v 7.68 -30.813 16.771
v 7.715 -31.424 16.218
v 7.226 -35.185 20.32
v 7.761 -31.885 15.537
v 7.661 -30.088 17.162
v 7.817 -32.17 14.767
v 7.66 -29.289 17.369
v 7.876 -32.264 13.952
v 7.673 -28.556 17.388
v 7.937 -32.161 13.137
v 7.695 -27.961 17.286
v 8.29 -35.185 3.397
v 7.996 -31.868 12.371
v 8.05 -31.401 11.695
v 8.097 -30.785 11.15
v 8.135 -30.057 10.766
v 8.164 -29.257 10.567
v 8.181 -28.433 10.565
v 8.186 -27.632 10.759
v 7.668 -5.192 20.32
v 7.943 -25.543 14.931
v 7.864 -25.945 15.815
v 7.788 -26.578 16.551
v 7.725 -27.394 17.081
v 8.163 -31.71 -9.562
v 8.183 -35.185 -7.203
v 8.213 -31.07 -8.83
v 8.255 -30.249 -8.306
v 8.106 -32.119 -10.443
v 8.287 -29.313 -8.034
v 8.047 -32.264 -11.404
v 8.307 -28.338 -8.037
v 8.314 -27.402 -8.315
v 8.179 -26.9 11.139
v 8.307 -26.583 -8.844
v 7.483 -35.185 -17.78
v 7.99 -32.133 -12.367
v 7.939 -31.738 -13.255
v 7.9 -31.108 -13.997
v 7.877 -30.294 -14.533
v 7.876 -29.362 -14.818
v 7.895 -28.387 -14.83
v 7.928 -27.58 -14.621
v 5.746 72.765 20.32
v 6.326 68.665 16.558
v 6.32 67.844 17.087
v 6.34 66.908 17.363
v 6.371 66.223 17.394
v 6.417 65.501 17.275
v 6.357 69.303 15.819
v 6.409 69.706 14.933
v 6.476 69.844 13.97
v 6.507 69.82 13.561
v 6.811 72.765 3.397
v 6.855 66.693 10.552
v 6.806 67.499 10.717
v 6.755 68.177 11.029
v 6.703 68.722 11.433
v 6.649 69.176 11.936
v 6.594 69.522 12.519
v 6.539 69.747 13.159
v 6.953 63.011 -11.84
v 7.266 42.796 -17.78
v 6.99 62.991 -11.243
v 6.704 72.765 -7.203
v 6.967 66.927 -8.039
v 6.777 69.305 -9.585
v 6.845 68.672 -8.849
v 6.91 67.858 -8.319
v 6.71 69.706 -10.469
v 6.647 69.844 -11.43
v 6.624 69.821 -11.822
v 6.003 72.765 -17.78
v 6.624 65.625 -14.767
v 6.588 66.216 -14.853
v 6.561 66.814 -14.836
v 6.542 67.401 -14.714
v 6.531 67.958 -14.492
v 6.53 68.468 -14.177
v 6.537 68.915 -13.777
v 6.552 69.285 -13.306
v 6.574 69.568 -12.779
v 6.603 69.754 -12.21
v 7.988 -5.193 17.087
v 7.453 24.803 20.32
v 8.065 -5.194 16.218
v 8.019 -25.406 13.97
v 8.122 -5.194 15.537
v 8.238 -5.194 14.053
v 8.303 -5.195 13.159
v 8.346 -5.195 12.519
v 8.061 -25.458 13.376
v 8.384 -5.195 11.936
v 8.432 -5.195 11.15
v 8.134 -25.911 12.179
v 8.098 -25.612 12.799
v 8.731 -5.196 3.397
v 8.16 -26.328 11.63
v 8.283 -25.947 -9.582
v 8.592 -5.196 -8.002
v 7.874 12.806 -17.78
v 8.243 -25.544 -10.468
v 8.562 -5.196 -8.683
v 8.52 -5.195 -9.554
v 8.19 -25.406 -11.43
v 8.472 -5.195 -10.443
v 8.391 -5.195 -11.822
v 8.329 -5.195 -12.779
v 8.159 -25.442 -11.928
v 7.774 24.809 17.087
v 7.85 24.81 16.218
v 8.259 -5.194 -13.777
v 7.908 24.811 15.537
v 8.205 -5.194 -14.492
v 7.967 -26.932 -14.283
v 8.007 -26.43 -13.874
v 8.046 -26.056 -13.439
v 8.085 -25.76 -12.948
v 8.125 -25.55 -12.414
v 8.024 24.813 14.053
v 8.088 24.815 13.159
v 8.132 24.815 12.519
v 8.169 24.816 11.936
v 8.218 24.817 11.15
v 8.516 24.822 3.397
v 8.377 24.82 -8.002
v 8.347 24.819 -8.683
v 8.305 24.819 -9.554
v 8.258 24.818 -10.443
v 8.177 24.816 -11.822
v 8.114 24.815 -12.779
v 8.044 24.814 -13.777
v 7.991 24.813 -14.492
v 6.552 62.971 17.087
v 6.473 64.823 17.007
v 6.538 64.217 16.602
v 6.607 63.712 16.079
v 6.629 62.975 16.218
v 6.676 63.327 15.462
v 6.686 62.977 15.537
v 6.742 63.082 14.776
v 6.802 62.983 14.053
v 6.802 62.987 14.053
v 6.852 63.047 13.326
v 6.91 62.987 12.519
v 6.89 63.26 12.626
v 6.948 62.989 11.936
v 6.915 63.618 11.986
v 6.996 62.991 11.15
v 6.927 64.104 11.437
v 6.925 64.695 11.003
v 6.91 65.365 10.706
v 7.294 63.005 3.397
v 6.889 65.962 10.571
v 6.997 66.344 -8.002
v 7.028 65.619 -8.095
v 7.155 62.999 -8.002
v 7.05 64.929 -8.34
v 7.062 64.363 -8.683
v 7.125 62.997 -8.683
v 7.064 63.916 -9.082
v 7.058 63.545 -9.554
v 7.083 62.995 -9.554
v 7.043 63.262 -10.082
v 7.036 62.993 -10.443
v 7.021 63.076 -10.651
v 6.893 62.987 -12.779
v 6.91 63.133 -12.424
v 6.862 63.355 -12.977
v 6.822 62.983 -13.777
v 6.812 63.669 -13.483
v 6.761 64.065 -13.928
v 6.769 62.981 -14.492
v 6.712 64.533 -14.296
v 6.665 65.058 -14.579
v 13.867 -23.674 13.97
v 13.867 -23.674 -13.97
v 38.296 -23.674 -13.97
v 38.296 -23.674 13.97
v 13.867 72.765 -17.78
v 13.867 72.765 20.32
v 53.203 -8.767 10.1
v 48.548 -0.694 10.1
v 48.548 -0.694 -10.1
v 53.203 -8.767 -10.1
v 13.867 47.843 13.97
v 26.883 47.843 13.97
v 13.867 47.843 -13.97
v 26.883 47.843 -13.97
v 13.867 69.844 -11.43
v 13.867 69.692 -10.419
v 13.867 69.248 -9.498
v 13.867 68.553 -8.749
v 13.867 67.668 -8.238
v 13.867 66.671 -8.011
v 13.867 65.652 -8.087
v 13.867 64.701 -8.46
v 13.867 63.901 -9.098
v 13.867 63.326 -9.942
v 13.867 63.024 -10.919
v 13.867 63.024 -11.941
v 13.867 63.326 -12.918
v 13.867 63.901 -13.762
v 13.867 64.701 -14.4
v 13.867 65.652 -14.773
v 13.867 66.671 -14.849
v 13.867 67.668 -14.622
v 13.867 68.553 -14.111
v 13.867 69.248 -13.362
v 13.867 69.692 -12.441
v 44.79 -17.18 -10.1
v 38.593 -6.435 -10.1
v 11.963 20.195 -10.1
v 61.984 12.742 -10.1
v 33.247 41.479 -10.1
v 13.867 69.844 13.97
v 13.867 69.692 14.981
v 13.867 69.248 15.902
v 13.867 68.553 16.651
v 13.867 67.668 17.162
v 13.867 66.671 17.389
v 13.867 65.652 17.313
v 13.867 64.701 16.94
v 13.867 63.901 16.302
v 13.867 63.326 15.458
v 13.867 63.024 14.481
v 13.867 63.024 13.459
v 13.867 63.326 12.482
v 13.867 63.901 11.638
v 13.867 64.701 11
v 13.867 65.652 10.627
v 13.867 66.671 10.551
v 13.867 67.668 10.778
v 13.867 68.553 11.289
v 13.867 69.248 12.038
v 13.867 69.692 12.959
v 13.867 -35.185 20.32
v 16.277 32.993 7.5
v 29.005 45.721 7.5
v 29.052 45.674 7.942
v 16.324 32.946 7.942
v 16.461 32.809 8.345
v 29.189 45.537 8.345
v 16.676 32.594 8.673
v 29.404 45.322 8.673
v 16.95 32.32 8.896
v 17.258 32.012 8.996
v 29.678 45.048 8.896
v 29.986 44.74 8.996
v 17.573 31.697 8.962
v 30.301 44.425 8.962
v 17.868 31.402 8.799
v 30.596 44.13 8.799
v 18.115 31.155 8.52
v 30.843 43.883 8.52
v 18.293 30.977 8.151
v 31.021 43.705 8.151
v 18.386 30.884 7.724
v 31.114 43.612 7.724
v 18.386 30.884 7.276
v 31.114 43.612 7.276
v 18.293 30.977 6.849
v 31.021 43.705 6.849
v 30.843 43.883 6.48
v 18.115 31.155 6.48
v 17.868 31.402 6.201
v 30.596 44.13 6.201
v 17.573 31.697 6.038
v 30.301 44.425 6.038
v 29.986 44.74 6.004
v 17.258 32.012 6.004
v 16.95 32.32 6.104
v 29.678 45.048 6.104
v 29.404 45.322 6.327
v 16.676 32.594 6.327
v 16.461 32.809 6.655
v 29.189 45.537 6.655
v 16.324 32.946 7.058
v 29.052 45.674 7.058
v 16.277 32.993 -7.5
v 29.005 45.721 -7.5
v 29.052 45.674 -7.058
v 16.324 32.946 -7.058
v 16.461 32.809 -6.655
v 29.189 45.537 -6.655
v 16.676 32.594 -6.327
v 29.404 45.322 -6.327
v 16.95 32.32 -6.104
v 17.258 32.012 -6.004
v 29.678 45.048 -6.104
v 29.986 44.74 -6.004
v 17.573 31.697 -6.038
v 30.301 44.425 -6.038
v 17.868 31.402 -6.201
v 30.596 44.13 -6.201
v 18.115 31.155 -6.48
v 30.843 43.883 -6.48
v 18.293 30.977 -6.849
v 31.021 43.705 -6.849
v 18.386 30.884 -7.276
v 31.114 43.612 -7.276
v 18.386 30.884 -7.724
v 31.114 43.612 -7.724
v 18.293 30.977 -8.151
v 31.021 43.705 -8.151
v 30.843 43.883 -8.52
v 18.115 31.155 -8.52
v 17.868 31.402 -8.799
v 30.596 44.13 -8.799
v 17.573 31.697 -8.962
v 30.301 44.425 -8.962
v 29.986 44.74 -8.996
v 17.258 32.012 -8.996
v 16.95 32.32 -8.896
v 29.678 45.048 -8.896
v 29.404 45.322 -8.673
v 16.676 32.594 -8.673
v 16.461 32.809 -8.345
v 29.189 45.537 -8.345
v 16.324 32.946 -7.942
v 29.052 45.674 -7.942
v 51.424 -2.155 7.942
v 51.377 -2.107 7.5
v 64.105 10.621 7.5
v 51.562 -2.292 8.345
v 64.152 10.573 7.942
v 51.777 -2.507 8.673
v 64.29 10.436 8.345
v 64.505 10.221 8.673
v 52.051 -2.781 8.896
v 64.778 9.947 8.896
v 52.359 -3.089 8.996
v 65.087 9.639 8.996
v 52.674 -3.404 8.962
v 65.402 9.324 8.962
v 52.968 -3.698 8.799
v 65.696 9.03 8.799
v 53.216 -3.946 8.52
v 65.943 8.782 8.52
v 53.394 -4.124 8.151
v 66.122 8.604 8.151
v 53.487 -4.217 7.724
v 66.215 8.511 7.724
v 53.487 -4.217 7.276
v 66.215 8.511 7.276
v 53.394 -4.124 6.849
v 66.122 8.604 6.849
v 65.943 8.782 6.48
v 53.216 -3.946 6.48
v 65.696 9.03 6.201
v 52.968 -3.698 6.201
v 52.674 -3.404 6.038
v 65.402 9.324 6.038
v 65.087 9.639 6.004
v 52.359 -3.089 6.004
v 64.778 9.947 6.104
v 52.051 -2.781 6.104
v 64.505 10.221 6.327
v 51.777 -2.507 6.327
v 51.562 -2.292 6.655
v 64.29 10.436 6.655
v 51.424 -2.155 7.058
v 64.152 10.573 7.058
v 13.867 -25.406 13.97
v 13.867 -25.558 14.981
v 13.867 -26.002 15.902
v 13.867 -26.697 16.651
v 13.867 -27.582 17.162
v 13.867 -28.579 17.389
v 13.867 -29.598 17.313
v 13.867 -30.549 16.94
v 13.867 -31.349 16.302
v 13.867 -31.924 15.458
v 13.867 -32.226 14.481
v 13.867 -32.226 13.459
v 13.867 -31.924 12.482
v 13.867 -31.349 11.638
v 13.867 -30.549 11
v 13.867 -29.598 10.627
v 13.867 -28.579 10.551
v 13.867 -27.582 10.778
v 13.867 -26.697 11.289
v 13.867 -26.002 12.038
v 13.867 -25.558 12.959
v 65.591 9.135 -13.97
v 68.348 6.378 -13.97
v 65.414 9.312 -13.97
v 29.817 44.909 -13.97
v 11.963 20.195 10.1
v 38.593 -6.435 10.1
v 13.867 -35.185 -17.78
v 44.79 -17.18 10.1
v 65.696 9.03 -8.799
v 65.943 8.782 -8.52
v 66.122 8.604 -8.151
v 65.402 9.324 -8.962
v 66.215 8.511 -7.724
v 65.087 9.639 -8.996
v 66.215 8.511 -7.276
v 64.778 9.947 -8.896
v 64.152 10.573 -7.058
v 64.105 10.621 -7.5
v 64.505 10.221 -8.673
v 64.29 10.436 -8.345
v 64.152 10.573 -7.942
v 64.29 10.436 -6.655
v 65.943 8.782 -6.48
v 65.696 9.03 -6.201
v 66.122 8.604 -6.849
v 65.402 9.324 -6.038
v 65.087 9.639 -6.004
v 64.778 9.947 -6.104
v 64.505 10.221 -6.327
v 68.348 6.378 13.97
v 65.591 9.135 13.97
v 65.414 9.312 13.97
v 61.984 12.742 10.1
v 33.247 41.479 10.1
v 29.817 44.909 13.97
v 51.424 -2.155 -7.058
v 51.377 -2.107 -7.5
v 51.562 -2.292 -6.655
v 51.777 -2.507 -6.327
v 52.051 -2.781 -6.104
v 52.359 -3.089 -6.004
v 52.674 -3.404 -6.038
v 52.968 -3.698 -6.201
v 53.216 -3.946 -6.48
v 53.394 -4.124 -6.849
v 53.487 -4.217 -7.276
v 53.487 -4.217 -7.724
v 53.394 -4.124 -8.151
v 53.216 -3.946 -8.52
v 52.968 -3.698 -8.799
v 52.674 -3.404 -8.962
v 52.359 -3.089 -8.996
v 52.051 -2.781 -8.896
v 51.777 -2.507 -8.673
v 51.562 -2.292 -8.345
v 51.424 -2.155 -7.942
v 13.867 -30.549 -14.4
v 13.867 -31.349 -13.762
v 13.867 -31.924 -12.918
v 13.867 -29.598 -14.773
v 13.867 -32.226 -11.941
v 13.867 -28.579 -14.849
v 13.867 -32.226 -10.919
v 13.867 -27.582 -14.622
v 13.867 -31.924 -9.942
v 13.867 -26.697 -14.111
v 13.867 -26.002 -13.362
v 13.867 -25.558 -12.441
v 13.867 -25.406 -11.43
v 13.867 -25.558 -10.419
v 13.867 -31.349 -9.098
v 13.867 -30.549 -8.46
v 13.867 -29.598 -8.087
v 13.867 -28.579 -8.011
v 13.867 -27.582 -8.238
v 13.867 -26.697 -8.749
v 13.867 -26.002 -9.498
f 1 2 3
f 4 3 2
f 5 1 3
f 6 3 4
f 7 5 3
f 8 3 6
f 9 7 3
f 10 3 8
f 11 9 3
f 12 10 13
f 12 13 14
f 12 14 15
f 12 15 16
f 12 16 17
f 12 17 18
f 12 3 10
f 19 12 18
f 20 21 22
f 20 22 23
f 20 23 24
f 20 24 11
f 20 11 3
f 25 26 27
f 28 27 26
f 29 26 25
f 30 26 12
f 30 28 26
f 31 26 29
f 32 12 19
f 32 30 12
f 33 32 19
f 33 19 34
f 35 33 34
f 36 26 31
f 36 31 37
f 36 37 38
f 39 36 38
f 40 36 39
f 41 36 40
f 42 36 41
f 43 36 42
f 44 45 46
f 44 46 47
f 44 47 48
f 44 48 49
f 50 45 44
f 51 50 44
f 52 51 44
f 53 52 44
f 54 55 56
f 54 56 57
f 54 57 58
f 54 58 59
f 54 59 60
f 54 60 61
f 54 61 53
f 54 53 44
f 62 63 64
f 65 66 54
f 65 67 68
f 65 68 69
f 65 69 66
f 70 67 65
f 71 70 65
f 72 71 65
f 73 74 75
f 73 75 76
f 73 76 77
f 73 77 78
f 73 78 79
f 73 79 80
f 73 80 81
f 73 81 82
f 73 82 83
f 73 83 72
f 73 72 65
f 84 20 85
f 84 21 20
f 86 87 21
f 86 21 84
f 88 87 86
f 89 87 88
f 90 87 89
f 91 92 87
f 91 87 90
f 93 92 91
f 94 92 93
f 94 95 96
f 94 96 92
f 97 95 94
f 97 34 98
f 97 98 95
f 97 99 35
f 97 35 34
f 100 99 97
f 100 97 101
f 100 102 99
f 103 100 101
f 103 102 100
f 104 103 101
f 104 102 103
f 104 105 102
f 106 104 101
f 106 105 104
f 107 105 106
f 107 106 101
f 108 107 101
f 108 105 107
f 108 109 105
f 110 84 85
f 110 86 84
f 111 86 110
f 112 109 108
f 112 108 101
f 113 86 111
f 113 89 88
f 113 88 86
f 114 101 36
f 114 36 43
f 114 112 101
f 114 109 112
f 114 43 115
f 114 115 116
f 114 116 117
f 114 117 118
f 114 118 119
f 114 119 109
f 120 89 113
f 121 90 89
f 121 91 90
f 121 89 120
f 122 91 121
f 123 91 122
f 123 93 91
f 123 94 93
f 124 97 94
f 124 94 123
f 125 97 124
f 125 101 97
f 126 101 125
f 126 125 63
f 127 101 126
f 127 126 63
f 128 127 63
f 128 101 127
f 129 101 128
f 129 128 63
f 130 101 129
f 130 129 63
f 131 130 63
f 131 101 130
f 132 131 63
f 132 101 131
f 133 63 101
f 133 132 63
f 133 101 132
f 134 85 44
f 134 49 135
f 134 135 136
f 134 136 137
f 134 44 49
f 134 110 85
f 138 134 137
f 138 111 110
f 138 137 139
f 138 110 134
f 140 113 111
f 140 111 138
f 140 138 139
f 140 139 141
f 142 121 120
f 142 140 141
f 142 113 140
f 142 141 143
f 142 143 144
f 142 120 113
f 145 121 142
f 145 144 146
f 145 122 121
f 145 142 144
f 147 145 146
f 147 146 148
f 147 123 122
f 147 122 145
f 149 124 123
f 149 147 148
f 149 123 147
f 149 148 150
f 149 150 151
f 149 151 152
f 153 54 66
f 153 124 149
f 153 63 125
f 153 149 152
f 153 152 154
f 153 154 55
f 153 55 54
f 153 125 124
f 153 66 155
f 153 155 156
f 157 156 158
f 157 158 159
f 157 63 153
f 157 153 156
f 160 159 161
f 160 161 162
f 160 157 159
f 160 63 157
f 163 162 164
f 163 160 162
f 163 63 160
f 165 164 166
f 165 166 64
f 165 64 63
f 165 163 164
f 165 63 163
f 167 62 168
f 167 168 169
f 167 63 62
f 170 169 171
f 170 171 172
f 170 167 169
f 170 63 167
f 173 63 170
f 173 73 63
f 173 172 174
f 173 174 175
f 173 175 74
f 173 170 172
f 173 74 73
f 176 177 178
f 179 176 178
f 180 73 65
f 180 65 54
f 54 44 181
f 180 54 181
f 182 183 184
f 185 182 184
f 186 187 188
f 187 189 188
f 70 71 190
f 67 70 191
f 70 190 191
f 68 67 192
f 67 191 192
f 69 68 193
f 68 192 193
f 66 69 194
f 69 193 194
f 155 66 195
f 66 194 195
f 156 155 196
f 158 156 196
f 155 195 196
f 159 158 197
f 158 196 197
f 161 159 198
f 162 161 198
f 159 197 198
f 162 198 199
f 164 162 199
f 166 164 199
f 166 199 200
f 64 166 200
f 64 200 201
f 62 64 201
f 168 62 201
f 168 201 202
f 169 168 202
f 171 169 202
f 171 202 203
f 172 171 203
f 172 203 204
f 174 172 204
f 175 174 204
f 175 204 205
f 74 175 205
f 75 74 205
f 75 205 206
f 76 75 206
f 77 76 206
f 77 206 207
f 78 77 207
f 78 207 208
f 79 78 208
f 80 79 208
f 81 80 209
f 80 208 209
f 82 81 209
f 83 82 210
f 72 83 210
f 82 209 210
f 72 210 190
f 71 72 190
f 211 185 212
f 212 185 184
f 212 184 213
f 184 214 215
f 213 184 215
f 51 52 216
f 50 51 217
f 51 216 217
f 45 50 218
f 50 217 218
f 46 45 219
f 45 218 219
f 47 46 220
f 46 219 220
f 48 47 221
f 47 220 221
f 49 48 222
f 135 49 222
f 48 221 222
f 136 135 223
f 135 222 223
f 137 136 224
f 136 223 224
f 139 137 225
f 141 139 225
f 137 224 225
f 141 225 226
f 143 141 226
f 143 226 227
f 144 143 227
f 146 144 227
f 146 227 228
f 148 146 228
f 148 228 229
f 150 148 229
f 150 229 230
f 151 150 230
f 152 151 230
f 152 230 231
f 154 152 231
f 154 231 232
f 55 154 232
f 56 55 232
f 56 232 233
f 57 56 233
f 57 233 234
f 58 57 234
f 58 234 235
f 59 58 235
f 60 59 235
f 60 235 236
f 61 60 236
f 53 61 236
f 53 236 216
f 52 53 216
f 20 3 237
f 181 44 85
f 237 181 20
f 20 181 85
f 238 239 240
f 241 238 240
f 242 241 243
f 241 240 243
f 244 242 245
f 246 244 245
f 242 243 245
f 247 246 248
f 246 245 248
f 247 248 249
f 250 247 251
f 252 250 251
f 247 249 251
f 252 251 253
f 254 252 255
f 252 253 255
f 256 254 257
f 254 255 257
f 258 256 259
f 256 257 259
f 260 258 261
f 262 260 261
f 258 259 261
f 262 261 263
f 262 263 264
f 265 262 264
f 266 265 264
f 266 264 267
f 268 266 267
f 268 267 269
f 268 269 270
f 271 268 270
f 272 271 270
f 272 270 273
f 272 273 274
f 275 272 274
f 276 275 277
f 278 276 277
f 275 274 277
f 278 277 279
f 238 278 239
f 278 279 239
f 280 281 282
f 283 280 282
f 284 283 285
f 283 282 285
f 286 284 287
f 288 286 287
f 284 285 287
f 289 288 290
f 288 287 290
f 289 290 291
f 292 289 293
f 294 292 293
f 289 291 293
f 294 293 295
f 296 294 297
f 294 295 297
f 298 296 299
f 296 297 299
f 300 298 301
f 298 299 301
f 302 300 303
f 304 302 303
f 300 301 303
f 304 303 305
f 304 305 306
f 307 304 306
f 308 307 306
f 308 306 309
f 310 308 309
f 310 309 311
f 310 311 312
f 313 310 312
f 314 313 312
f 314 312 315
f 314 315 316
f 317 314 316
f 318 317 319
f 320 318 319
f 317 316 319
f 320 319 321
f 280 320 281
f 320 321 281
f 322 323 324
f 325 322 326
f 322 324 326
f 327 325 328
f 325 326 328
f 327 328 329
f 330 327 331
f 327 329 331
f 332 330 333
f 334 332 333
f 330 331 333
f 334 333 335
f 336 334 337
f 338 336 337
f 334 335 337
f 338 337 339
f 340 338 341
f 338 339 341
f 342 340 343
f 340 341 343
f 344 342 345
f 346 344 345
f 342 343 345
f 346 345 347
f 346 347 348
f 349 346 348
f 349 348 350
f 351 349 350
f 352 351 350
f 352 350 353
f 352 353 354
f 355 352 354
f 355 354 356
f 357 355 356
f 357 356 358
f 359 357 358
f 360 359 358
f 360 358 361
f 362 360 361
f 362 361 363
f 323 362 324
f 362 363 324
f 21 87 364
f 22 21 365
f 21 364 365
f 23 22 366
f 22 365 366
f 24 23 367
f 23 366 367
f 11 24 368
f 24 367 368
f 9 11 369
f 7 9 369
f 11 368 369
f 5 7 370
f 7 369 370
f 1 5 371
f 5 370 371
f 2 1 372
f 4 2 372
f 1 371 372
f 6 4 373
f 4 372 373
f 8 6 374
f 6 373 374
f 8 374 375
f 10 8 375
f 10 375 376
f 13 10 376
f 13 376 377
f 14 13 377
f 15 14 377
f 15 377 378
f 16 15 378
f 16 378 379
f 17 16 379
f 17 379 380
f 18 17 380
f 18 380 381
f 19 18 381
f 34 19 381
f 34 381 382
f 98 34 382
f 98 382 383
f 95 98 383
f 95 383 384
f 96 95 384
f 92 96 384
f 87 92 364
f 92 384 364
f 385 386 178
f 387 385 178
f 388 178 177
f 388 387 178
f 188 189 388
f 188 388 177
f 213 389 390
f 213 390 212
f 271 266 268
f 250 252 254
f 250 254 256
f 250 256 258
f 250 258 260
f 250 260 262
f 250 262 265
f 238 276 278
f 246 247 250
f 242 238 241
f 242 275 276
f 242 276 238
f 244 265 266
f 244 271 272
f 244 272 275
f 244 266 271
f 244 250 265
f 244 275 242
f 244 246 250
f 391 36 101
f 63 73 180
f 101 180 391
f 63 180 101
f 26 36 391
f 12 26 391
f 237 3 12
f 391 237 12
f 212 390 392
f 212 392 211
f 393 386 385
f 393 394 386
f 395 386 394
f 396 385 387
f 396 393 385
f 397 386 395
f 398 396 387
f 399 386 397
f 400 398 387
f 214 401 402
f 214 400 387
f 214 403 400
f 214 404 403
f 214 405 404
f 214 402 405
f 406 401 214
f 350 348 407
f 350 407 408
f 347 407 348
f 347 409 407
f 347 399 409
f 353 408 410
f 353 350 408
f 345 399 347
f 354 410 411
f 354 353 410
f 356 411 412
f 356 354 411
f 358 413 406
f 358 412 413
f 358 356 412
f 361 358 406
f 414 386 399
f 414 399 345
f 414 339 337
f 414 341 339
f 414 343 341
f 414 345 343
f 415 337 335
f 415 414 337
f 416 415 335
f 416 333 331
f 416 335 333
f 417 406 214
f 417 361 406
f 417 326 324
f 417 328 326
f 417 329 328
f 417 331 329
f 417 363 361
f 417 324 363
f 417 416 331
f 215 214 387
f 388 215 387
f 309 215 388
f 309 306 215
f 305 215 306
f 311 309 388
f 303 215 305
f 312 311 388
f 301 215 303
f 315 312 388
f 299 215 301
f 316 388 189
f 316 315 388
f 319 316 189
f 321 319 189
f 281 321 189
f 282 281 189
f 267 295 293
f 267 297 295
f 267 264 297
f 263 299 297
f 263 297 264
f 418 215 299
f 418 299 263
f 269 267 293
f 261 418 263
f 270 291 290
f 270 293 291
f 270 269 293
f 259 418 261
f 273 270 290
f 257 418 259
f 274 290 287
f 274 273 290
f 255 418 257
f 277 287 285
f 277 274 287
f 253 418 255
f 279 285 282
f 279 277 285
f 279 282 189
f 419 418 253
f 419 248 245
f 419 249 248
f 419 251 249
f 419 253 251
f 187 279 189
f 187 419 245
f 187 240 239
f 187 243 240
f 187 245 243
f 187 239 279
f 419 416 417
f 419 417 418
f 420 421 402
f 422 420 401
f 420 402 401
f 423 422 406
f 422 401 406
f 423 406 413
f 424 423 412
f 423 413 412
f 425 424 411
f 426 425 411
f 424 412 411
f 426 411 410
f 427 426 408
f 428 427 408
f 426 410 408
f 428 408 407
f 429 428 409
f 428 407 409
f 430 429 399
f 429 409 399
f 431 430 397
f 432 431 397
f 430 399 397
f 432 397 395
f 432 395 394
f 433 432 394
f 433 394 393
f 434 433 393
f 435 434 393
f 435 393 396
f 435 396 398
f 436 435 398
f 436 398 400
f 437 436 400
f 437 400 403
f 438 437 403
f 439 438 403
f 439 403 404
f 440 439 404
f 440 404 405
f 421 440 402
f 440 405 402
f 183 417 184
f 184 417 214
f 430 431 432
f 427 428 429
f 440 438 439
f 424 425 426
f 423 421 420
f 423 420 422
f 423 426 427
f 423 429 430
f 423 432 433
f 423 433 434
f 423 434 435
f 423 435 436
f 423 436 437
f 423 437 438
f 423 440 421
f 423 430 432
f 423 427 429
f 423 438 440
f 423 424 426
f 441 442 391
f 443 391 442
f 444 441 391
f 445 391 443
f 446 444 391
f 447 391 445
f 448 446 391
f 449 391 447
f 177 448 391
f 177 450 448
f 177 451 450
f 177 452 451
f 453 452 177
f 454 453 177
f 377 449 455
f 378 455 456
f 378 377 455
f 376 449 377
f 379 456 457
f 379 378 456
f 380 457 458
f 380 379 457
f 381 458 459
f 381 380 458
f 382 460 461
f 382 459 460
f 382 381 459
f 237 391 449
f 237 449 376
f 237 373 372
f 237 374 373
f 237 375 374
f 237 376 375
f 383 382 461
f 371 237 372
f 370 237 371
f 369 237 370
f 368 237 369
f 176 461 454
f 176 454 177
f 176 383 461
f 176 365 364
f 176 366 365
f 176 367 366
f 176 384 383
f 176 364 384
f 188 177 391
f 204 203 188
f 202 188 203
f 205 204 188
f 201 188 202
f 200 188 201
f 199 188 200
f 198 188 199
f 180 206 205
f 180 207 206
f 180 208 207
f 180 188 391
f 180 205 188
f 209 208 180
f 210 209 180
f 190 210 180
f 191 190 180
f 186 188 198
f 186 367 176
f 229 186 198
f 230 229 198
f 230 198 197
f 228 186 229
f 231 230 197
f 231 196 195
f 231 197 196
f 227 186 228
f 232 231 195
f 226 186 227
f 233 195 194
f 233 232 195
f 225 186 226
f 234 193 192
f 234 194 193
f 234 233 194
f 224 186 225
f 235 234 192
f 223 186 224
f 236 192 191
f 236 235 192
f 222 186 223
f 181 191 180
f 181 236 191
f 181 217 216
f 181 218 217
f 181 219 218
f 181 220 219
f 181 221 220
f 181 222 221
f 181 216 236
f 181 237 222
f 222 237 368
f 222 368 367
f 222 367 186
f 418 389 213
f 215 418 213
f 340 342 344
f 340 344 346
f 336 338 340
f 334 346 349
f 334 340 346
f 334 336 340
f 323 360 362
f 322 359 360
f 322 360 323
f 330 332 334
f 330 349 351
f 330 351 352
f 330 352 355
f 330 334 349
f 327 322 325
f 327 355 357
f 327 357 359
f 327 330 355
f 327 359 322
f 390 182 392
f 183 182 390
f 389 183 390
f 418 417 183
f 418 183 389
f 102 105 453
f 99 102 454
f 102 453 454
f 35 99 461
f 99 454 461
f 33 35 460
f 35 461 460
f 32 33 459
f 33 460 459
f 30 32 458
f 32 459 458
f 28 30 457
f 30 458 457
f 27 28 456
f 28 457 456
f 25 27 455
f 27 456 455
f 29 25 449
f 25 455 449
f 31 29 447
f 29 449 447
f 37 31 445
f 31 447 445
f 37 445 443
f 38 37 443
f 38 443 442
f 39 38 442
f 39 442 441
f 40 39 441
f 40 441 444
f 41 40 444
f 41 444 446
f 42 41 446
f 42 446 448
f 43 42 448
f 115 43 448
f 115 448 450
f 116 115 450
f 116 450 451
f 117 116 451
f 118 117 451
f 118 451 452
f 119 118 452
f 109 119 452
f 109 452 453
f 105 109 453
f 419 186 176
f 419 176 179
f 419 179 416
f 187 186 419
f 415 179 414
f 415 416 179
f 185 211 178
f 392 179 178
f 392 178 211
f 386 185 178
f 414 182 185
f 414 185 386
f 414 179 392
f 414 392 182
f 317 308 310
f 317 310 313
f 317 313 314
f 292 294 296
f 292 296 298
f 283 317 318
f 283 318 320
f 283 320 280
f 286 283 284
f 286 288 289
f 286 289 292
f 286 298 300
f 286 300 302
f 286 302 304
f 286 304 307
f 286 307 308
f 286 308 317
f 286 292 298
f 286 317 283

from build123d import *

# Parameters (mm, degrees)
SKETCH1_W               = 15.24
SKETCH1_H               = 47.25
BOSS_EXTRUDE1_DEPTH     = 29
BOSS_EXTRUDE2_DEPTH     = 15.24
BOSS_EXTRUDE3_START     = 6.35
BOSS_EXTRUDE3_DEPTH     = 27.94
CUT_EXTRUDE4_DEPTH      = 90.856122335
CUT_EXTRUDE4_DEPTH_BACK = 90.856122335
BOSS_EXTRUDE4_START     = 12.7
SKETCH15_W              = 12.73404056
SKETCH15_H              = 107.95
BOSS_EXTRUDE4_DEPTH     = 38.1
SKETCH17_R              = 3.429
CUT_EXTRUDE6_DEPTH      = 95.762638832
BOSS_EXTRUDE9_DEPTH     = 6.35
BOSS_EXTRUDE10_DEPTH    = 6.35
SKETCH12_W              = 20.20062
SKETCH12_H              = 40.64
CUT_EXTRUDE8_DEPTH      = 38.1
SKETCH21_W              = 27.94
SKETCH21_H              = 50.342193805
CUT_EXTRUDE9_DEPTH      = 8
SKETCH22_W              = 27.94
SKETCH22_H              = 8
CUT_EXTRUDE10_DEPTH     = 2.54
BOSS_EXTRUDE11_DEPTH    = 13.97
SKETCH24_W              = 11.491520074
SKETCH24_H              = 20.20062
CUT_EXTRUDE11_DEPTH     = 112.502999945
SKETCH25_R              = 1.5
CUT_EXTRUDE12_DEPTH     = 18


with BuildPart() as part:
    # Sketch1 → Boss-Extrude1 (new body)
    with BuildSketch(Plane(origin=(0, 0, 0), x_dir=(0, 0, -1), z_dir=(1, 0, 0))):
        Rectangle(SKETCH1_W, SKETCH1_H)
    extrude(amount=BOSS_EXTRUDE1_DEPTH)

    # Sketch8 → Cut-Revolve1 (revolve, cut)
    with BuildSketch(Plane(origin=(0, 0, 0), x_dir=(1, 0, 0), z_dir=(0, 1, 0))):
        with BuildLine():
            Line((-1363.98, 509.27), (-1363.98, -509.27))
            add(Edge.make_bspline(
                [(-1363.98, -509.27), (8.89, -509.27), (8.89, 0), (8.89, 509.27), (-1363.98, 509.27)],
                knots=[4.71238898, 4.71238898, 4.71238898, 6.283185307, 6.283185307, 7.853981634, 7.853981634, 7.853981634], degree=2, weights=[1, 0.707106781, 1, 0.707106781, 1]))
        make_face()
    revolve(axis=Axis((-1363.98, 0, -509.27), (0, 0, 1)), mode=Mode.SUBTRACT)

    # Sketch9 → Boss-Extrude2 (add)
    with BuildSketch(Plane.XY.offset(7.62)):
        Polygon((29, -23.625), (57.293684645, -23.625), (29, 23.625), align=None)
    extrude(amount=-BOSS_EXTRUDE2_DEPTH)

    # Sketch11 → Boss-Extrude3 (add)
    with BuildSketch(Plane(origin=(0, 0, -7.62), x_dir=(-1, 0, 0), z_dir=(0, 0, -1)).offset(BOSS_EXTRUDE3_START)):
        Polygon((-8.532999942, 23.625), (-35.473768305, 50.565768363), (-71.071074924, 14.968461744), (-48.544371121, -9.013786608), (-28.889356272, 23.625), align=None)
    extrude(amount=-BOSS_EXTRUDE3_DEPTH)

    # Sketch13 → Cut-Extrude4 (cut, two sides: drawn at the far end of the back side and taken through both)
    with BuildSketch(Plane(origin=(0, 0, -7.62), x_dir=(-1, 0, 0), z_dir=(0, 0, -1)).offset(-CUT_EXTRUDE4_DEPTH_BACK)):
        Polygon((-61.672265147, 5.569651967), (-8.532999942, -23.625), (-25.02523354, -53.6436889), (-79.417056311, -23.760883228), align=None)
    extrude(amount=CUT_EXTRUDE4_DEPTH + CUT_EXTRUDE4_DEPTH_BACK, mode=Mode.SUBTRACT)

    # Sketch15 → Boss-Extrude4 (add)
    with BuildSketch(Plane.XY.offset(7.62).offset(BOSS_EXTRUDE4_START)):
        with Locations((7.499979662, 18.790026662)):
            Rectangle(SKETCH15_W, SKETCH15_H)
    extrude(amount=-BOSS_EXTRUDE4_DEPTH)

    # Sketch16 → Cut-Revolve2 (revolve, cut)
    with BuildSketch(Plane(origin=(0, 0, 0), x_dir=(1, 0, 0), z_dir=(0, 1, 0))):
        with BuildLine():
            Line((-1364.099005706, 509.27), (-1364.099005706, -509.27))
            add(Edge.make_bspline(
                [(-1364.099005706, -509.27), (8.770994294, -509.27), (8.770994294, 0), (8.770994294, 509.27), (-1364.099005706, 509.27)],
                knots=[4.71238898, 4.71238898, 4.71238898, 6.283185307, 6.283185307, 7.853981634, 7.853981634, 7.853981634], degree=2, weights=[1, 0.707106781, 1, 0.707106781, 1]))
        make_face()
    revolve(axis=Axis((-1364.099005706, 0, -509.27), (0, 0, 1)), mode=Mode.SUBTRACT)

    # Sketch17 → Cut-Extrude6 (cut, through all)
    with BuildSketch(Plane(origin=(13.866999942, 0, 0), x_dir=(0, 0, -1), z_dir=(1, 0, 0))):
        with Locations(Location((-13.97, -28.834973338, 0), (0, 0, 90))):
            Circle(SKETCH17_R)
        with Locations(Location((-13.97, 66.415026662, 0), (0, 0, 90))):
            Circle(SKETCH17_R)
        with Locations(Location((11.43, 66.415026662, 0), (0, 0, 90))):
            Circle(SKETCH17_R)
        with Locations(Location((11.43, -28.834973338, 0), (0, 0, 90))):
            Circle(SKETCH17_R)
    extrude(amount=-CUT_EXTRUDE6_DEPTH, mode=Mode.SUBTRACT)

    # Sketch19 → Boss-Extrude9 (add)
    with BuildSketch(Plane.XY.offset(7.62)):
        Polygon((13.866999942, 23.625), (13.866999942, -20.694506456), (45.209055073, -3.475216955), (28.889356272, 23.625), align=None)
    extrude(amount=BOSS_EXTRUDE9_DEPTH)

    # Sketch20 → Boss-Extrude10 (add)
    with BuildSketch(Plane(origin=(0, 0, -7.62), x_dir=(-1, 0, 0), z_dir=(0, 0, -1))):
        Polygon((-45.209055073, -3.475216955), (-13.866999942, -20.694506456), (-13.866999942, 23.625), (-28.889356272, 23.625), align=None)
    extrude(amount=BOSS_EXTRUDE10_DEPTH)

    # Sketch12 → Cut-Extrude8 (cut)
    with BuildSketch(Plane(origin=(43.019768334, 43.019768334, 0), x_dir=(0, 0, -1), z_dir=(0.7071067811865476, 0.7071067811865476, 0))):
        with Locations((0, -14.49944132)):
            Rectangle(SKETCH12_W, SKETCH12_H)
    extrude(amount=-CUT_EXTRUDE8_DEPTH, mode=Mode.SUBTRACT)

    # Sketch21 → Cut-Extrude9 (cut)
    with BuildSketch(Plane(origin=(43.019768334, 43.019768334, 0), x_dir=(0, 0, -1), z_dir=(0.7071067811865477, 0.7071067811865475, 0))):
        with Locations((0, -14.49944132)):
            Rectangle(SKETCH21_W, SKETCH21_H)
    extrude(amount=-CUT_EXTRUDE9_DEPTH, mode=Mode.SUBTRACT)

    # Sketch22 → Cut-Extrude10 (cut)
    with BuildSketch(Plane(origin=(28.05130659, -28.05130659, 0), x_dir=(0, 0, 1), z_dir=(-0.7071067811865476, 0.7071067811865476, 0))):
        with Locations((0, 56.839139829)):
            Rectangle(SKETCH22_W, SKETCH22_H)
    extrude(amount=-CUT_EXTRUDE10_DEPTH, mode=Mode.SUBTRACT)

    # Sketch23 → Boss-Extrude11 (add, symmetric)
    with BuildSketch(Plane.XY):
        Polygon((29.816914056, 44.908914114), (26.883196541, 47.842631629), (13.866999942, 47.842631629), (13.866999942, 28.959), align=None)
        Polygon((65.591257632, 9.134570538), (13.866999942, -20.694506456), (13.866999942, -23.674292513), (38.295755697, -23.674292513), (68.34793819, 6.37788998), align=None)
    extrude(amount=BOSS_EXTRUDE11_DEPTH, both=True)

    # Sketch24 → Cut-Extrude11 (cut, through all)
    with BuildSketch(Plane(origin=(12.416727049, -21.530870355, 0), x_dir=(0.8662714122168664, 0.49957365860881403, 0), z_dir=(-0.49957365860881403, 0.8662714122168664, 0))):
        with Locations((35.963054904, 0)):
            Rectangle(SKETCH24_W, SKETCH24_H)
    extrude(amount=-CUT_EXTRUDE11_DEPTH, mode=Mode.SUBTRACT)

    # Sketch25 → Cut-Extrude12 (cut)
    with BuildSketch(Plane(origin=(37.362914085, 37.362914085, 0), x_dir=(0, 0, -1), z_dir=(0.7071067811865476, 0.7071067811865475, 0))):
        with Locations(Location((-7.5, 10.32055868, 0), (0, 0, 90))):
            Circle(SKETCH25_R)
        with Locations(Location((7.5, 10.32055868, 0), (0, 0, 90))):
            Circle(SKETCH25_R)
        with Locations(Location((-7.5, -39.31944132, 0), (0, 0, 90))):
            Circle(SKETCH25_R)
        with Locations(Location((7.5, -39.31944132, 0), (0, 0, 90))):
            Circle(SKETCH25_R)
    extrude(amount=-CUT_EXTRUDE12_DEPTH, mode=Mode.SUBTRACT)


solid = part.part
